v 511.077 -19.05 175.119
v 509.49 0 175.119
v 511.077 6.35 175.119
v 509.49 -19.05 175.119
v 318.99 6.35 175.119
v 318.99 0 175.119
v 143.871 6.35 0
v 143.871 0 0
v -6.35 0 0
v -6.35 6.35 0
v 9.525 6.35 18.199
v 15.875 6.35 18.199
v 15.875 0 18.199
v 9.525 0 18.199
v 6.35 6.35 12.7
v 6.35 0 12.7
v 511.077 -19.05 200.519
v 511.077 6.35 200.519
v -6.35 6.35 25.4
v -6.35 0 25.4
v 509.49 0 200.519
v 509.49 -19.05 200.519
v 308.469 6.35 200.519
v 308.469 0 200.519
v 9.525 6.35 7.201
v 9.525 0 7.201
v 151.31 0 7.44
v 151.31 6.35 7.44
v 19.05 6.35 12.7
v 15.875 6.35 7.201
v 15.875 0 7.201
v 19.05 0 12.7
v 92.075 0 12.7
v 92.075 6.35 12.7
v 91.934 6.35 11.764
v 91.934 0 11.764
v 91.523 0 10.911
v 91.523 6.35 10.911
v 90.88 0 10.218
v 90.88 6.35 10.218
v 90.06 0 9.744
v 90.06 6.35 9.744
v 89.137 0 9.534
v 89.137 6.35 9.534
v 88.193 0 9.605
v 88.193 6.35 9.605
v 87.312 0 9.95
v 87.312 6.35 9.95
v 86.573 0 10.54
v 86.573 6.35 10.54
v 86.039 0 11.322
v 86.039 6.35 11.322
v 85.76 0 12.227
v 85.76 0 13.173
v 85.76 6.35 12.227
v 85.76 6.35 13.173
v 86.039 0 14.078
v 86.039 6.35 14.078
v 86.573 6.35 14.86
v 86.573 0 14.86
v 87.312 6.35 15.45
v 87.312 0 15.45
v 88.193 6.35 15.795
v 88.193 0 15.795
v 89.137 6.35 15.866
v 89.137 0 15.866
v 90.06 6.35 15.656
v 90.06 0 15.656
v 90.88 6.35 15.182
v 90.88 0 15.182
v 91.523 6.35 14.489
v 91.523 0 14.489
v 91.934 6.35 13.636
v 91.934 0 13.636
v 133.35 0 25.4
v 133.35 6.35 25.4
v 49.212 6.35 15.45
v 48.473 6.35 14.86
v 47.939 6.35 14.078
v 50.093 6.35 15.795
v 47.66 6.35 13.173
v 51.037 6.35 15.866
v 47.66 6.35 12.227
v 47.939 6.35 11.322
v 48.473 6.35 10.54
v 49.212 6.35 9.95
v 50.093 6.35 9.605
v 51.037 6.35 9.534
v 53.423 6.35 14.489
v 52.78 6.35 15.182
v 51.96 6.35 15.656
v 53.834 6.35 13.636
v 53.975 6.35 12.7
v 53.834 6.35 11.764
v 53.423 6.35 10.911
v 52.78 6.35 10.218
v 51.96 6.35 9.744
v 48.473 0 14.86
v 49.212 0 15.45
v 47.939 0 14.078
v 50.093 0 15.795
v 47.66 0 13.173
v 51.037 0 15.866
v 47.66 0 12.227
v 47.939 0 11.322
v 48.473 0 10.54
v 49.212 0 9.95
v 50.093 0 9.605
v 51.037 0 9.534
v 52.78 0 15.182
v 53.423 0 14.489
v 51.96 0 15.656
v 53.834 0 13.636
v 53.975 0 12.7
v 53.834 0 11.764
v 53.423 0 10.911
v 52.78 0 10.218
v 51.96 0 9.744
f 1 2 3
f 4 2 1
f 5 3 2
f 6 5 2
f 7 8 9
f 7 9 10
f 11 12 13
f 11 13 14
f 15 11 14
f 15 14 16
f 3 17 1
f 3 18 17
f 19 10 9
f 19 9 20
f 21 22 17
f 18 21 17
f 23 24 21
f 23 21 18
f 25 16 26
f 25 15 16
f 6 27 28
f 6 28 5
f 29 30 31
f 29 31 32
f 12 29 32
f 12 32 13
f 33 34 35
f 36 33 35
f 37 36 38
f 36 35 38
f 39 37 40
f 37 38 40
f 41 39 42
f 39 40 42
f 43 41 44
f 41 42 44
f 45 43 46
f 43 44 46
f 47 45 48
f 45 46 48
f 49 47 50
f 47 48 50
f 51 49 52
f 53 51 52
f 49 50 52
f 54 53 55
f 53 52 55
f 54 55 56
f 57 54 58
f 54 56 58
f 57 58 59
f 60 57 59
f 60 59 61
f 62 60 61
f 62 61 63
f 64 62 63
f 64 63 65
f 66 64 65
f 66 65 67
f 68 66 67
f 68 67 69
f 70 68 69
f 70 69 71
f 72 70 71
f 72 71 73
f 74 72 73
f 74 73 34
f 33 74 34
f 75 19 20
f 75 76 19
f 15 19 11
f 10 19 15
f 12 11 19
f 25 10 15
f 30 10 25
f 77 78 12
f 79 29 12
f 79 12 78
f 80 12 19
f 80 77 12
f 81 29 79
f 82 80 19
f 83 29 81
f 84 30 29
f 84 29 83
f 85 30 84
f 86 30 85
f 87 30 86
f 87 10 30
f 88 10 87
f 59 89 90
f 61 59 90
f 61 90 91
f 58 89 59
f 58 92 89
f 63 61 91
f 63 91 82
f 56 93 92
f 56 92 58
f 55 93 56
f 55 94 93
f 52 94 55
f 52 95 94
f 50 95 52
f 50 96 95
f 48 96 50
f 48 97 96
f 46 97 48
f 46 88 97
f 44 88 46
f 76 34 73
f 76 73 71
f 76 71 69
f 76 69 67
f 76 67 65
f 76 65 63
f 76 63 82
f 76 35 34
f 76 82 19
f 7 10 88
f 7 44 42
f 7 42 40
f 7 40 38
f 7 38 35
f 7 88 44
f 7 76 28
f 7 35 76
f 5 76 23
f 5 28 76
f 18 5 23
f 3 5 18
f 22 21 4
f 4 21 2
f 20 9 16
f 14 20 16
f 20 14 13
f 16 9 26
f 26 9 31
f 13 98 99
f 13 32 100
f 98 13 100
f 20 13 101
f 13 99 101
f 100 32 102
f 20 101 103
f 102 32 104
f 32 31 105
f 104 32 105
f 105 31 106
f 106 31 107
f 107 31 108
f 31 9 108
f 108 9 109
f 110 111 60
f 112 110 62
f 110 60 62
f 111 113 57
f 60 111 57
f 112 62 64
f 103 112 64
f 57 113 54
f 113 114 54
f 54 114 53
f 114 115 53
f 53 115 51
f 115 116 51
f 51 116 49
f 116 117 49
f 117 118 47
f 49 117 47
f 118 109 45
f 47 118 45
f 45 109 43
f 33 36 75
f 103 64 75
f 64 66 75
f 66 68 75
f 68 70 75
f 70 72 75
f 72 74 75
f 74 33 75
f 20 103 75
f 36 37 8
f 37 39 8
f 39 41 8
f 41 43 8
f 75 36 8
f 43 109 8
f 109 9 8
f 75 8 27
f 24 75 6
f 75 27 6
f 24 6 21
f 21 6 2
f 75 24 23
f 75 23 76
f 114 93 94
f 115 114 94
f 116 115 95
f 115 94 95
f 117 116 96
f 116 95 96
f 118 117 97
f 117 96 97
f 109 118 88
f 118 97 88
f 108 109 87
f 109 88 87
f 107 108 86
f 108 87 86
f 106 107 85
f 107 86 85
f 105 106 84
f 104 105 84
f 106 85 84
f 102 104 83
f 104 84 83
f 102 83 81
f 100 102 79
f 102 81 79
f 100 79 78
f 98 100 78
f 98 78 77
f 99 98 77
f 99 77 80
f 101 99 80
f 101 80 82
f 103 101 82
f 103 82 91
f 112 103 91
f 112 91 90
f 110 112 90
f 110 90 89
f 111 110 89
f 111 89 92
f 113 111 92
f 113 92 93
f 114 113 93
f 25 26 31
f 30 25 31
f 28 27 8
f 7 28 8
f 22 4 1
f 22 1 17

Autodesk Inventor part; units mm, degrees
ref_plane "YZ Plane" through (0, 0, 0) normal (1, 0, 0) x (0, 1, 0)
ref_plane "XZ Plane" through (0, 0, 0) normal (0, 1, 0) x (-1, 0, 0)
ref_plane "XY Plane" through (0, 0, 0) normal (0, 0, 1) x (1, 0, 0)
sketch "Sketch1" plane through (0, 0, 0) normal (0, 1, 0) x (-1, 0, 0)
  line L0 (0, 0) -> (-133.35, 0)
  line L1 (-133.35, 0) -> (-133.35, 25.4)
  line L2 (-133.35, 25.4) -> (0, 25.4)
  line L3 (0, 25.4) -> (0, 0)
  line L4 (-133.35, 25.4) -> (-143.871, 0)
  line L5 (-133.35, 25.4) -> (-105.8572, 25.4) construction
  line L6 (-133.35, 25.4) -> (-151.3105, 7.4395)
  line L7 (-133.35, 25.4) -> (-107.95, 25.4) construction
  line L8 (-151.3105, 7.4395) -> (-143.871, 0)
  line L9 (-133.35, 25.4) -> (-151.3105, 7.4395)
  line L10 (-151.3105, 7.4395) -> (-318.9899, 175.1188)
  line L11 (-318.9899, 175.1188) -> (-301.0293, 193.0793)
  line L12 (-301.0293, 193.0793) -> (-133.35, 25.4)
  circle A0 centre (-12.7, 12.7) radius 6.35
  line L13 (-318.9899, 175.1188) -> (-509.4899, 175.1188)
  line L14 (-509.4899, 175.1188) -> (-509.4899, 200.5188)
  line L15 (-509.4899, 200.5188) -> (-318.9899, 200.5188)
  line L16 (-318.9899, 200.5188) -> (-318.9899, 175.1188)
  line L17 (-318.9899, 175.1188) -> (-308.4688, 200.5188)
  line L18 (-308.4688, 200.5188) -> (-318.9899, 200.5188)
  line L19 (-308.4688, 200.5188) -> (-301.0293, 193.0793)
  line L20 (-133.35, 0) -> (-143.871, 0)
  dimension "d0" = 133.35
  dimension "d1" = 25.4
  dimension "d2" = 112.5
  dimension "d3" = 25.4
  dimension "d4" = 135
  dimension "d5" = 237.1344
  dimension "d6" = 12.7
  dimension "d7" = 190.5
  dimension "d8" = 25.4
extrude "Extrusion1" add sketch "Sketch1" along normal blind 6.35
sketch "Sketch2" plane through (509.4899, 0, 200.5188) normal (1, 0, 0) x (0, 0, -1)
  line L0 (0, 6.35) -> (25.4, 6.35)
  line L1 (25.4, 6.35) -> (25.4, -19.05)
  line L2 (25.4, -19.05) -> (0, -19.05)
  line L3 (0, -19.05) -> (0, 6.35)
  point P0 (200.5188, 0)
  dimension "d11" = 25.4
  dimension "d12" = 25.4
extrude "Extrusion2" add sketch "Sketch2" along normal blind 1.5875
sketch "Sketch3" plane through (0, 0, 0) normal (-1, 0, 0) x (0, 0, 1)
  line L0 (0, 0) -> (25.4, 0) projected
  line L1 (25.4, 0) -> (25.4, 6.35) projected
  line L2 (0, 6.35) -> (25.4, 6.35) projected
  line L3 (0, 0) -> (0, 6.35) projected
extrude "Extrusion3" add sketch "Sketch3" along normal blind 44.45
sketch "Sketch6" plane through (0, 6.35, 0) normal (0, 1, 0) x (1, 0, 0)
  circle A0 centre (12.7, -12.7) radius 6.35 projected
  line L0 (318.9899, -175.1188) -> (511.0774, -175.1188) projected
  line L1 (12.7, -12.7) -> (12.7, -6.35)
  line L2 (16.3662, -6.35) -> (20.0323, -12.7)
  line L3 (20.0323, -12.7) -> (16.3662, -19.05)
  line L4 (16.3662, -19.05) -> (9.0338, -19.05)
  line L5 (9.0338, -19.05) -> (5.3677, -12.7)
  line L6 (5.3677, -12.7) -> (9.0338, -6.35)
  line L7 (9.0338, -6.35) -> (16.3662, -6.35)
  point P0 (0, 0)
extrude "Extrusion5" cut sketch "Sketch6" against normal blind 6.35 contours A0 L2 L3 | A0 L7 L2 | L3 L4 A0 | A0 L6 L7 | L4 L5 A0 | A0 L5 L6
sketch "Sketch8" plane through (0, 6.35, 0) normal (0, 1, 0) x (1, 0, 0)
  line L0 (143.871, 0) -> (-44.45, 0) projected
  line L1 (-44.45, -25.4) -> (-44.45, 0) projected
  line L2 (318.9899, -175.1188) -> (511.0774, -175.1188) projected
  line L3 (-44.45, -12.7) -> (12.7, -12.7)
  line L4 (12.7, -12.7) -> (12.7, 0)
  line L5 (12.7, -12.7) -> (-25.4, -12.7)
  line L6 (-25.4, -12.7) -> (50.8, -12.7)
  circle A0 centre (-25.4, -12.7) radius 3.175
  circle A1 centre (50.8, -12.7) radius 3.175
  point P0 (0, 0)
  dimension "d29" = 57.15
  dimension "d30" = 38.1
  dimension "d31" = 76.2
  dimension "d32" = 0
  dimension "d33" = 6.35
  dimension "d34" = 6.35
extrude "Extrusion7" cut sketch "Sketch8" against normal blind 25.4 contours A1 | A0 L3 | L3 A0
sketch "Sketch9" plane through (0, 6.35, 0) normal (0, 1, 0) x (1, 0, 0)
  circle A0 centre (50.8, -12.7) radius 3.175 projected
  circle A1 centre (-25.4, -12.7) radius 3.175 projected
  line L0 (-44.45, 0) -> (0, 0)
  line L1 (0, 0) -> (0, -25.4)
  line L2 (0, -25.4) -> (-44.45, -25.4)
  line L3 (-44.45, -25.4) -> (-44.45, 0)
  line L4 (0, -12.7) -> (12.7, -12.7)
  line L5 (12.7, -12.7) -> (50.8, -12.7)
  line L6 (50.8, -12.7) -> (88.9, -12.7)
  line L7 (50.8, -12.7) -> (88.9, -12.7) construction
  circle A2 centre (88.9, -12.7) radius 3.175
  dimension "d37" = 44.45
  dimension "d38" = 25.4
  dimension "d39" = 38.1
  dimension "d40" = 0
  dimension "d41" = 6.35
extrude "Extrusion8" cut sketch "Sketch9" against normal blind 25.4 contours L1 L2 L3 L0 | A2
sketch "Sketch10" plane through (0, 6.35, 0) normal (-1, 0, 0) x (0, 0, 1)
  line L0 (25.4, -6.35) -> (0, -6.35) projected
  line L1 (25.4, 0) -> (25.4, -6.35) projected
  line L2 (0, 0) -> (25.4, 0) projected
  line L3 (0, -6.35) -> (0, 0) projected
extrude "Extrusion9" add sketch "Sketch10" along normal blind 6.35
sketch "Sketch11" plane through (0, 6.35, 0) normal (0, 1, 0) x (1, 0, 0)
  line L0 (-6.35, -25.4) -> (-6.35, 0) projected
  line L1 (5.3677, -12.7) -> (9.0338, -6.35) projected
  line L2 (9.0338, -6.35) -> (16.3662, -6.35) projected
  line L3 (16.3662, -6.35) -> (20.0323, -12.7) projected
  line L4 (20.0323, -12.7) -> (16.3662, -19.05) projected
  line L5 (16.3662, -19.05) -> (9.0338, -19.05) projected
  line L6 (9.0338, -19.05) -> (5.3677, -12.7) projected
  line L7 (-6.35, -12.7) -> (12.7, -12.7)
  line L8 (12.7, -12.7) -> (6.35, -12.7)
  line L9 (12.7, -12.7) -> (19.05, -12.7) construction
  line L10 (6.35, -12.7) -> (9.525, -7.2007)
  line L11 (9.525, -7.2007) -> (15.875, -7.2007)
  line L12 (15.875, -7.2007) -> (19.05, -12.7)
  line L13 (19.05, -12.7) -> (15.875, -18.1993)
  line L14 (15.875, -18.1993) -> (9.525, -18.1993)
  line L15 (9.525, -18.1993) -> (6.35, -12.7)
  point P0 (0, 0)
  dimension "d46" = 6.35
  dimension "d47" = 180
extrude "Extrusion10" add sketch "Sketch11" against normal blind 6.35
properties part number "Z-PickupArm-R"
